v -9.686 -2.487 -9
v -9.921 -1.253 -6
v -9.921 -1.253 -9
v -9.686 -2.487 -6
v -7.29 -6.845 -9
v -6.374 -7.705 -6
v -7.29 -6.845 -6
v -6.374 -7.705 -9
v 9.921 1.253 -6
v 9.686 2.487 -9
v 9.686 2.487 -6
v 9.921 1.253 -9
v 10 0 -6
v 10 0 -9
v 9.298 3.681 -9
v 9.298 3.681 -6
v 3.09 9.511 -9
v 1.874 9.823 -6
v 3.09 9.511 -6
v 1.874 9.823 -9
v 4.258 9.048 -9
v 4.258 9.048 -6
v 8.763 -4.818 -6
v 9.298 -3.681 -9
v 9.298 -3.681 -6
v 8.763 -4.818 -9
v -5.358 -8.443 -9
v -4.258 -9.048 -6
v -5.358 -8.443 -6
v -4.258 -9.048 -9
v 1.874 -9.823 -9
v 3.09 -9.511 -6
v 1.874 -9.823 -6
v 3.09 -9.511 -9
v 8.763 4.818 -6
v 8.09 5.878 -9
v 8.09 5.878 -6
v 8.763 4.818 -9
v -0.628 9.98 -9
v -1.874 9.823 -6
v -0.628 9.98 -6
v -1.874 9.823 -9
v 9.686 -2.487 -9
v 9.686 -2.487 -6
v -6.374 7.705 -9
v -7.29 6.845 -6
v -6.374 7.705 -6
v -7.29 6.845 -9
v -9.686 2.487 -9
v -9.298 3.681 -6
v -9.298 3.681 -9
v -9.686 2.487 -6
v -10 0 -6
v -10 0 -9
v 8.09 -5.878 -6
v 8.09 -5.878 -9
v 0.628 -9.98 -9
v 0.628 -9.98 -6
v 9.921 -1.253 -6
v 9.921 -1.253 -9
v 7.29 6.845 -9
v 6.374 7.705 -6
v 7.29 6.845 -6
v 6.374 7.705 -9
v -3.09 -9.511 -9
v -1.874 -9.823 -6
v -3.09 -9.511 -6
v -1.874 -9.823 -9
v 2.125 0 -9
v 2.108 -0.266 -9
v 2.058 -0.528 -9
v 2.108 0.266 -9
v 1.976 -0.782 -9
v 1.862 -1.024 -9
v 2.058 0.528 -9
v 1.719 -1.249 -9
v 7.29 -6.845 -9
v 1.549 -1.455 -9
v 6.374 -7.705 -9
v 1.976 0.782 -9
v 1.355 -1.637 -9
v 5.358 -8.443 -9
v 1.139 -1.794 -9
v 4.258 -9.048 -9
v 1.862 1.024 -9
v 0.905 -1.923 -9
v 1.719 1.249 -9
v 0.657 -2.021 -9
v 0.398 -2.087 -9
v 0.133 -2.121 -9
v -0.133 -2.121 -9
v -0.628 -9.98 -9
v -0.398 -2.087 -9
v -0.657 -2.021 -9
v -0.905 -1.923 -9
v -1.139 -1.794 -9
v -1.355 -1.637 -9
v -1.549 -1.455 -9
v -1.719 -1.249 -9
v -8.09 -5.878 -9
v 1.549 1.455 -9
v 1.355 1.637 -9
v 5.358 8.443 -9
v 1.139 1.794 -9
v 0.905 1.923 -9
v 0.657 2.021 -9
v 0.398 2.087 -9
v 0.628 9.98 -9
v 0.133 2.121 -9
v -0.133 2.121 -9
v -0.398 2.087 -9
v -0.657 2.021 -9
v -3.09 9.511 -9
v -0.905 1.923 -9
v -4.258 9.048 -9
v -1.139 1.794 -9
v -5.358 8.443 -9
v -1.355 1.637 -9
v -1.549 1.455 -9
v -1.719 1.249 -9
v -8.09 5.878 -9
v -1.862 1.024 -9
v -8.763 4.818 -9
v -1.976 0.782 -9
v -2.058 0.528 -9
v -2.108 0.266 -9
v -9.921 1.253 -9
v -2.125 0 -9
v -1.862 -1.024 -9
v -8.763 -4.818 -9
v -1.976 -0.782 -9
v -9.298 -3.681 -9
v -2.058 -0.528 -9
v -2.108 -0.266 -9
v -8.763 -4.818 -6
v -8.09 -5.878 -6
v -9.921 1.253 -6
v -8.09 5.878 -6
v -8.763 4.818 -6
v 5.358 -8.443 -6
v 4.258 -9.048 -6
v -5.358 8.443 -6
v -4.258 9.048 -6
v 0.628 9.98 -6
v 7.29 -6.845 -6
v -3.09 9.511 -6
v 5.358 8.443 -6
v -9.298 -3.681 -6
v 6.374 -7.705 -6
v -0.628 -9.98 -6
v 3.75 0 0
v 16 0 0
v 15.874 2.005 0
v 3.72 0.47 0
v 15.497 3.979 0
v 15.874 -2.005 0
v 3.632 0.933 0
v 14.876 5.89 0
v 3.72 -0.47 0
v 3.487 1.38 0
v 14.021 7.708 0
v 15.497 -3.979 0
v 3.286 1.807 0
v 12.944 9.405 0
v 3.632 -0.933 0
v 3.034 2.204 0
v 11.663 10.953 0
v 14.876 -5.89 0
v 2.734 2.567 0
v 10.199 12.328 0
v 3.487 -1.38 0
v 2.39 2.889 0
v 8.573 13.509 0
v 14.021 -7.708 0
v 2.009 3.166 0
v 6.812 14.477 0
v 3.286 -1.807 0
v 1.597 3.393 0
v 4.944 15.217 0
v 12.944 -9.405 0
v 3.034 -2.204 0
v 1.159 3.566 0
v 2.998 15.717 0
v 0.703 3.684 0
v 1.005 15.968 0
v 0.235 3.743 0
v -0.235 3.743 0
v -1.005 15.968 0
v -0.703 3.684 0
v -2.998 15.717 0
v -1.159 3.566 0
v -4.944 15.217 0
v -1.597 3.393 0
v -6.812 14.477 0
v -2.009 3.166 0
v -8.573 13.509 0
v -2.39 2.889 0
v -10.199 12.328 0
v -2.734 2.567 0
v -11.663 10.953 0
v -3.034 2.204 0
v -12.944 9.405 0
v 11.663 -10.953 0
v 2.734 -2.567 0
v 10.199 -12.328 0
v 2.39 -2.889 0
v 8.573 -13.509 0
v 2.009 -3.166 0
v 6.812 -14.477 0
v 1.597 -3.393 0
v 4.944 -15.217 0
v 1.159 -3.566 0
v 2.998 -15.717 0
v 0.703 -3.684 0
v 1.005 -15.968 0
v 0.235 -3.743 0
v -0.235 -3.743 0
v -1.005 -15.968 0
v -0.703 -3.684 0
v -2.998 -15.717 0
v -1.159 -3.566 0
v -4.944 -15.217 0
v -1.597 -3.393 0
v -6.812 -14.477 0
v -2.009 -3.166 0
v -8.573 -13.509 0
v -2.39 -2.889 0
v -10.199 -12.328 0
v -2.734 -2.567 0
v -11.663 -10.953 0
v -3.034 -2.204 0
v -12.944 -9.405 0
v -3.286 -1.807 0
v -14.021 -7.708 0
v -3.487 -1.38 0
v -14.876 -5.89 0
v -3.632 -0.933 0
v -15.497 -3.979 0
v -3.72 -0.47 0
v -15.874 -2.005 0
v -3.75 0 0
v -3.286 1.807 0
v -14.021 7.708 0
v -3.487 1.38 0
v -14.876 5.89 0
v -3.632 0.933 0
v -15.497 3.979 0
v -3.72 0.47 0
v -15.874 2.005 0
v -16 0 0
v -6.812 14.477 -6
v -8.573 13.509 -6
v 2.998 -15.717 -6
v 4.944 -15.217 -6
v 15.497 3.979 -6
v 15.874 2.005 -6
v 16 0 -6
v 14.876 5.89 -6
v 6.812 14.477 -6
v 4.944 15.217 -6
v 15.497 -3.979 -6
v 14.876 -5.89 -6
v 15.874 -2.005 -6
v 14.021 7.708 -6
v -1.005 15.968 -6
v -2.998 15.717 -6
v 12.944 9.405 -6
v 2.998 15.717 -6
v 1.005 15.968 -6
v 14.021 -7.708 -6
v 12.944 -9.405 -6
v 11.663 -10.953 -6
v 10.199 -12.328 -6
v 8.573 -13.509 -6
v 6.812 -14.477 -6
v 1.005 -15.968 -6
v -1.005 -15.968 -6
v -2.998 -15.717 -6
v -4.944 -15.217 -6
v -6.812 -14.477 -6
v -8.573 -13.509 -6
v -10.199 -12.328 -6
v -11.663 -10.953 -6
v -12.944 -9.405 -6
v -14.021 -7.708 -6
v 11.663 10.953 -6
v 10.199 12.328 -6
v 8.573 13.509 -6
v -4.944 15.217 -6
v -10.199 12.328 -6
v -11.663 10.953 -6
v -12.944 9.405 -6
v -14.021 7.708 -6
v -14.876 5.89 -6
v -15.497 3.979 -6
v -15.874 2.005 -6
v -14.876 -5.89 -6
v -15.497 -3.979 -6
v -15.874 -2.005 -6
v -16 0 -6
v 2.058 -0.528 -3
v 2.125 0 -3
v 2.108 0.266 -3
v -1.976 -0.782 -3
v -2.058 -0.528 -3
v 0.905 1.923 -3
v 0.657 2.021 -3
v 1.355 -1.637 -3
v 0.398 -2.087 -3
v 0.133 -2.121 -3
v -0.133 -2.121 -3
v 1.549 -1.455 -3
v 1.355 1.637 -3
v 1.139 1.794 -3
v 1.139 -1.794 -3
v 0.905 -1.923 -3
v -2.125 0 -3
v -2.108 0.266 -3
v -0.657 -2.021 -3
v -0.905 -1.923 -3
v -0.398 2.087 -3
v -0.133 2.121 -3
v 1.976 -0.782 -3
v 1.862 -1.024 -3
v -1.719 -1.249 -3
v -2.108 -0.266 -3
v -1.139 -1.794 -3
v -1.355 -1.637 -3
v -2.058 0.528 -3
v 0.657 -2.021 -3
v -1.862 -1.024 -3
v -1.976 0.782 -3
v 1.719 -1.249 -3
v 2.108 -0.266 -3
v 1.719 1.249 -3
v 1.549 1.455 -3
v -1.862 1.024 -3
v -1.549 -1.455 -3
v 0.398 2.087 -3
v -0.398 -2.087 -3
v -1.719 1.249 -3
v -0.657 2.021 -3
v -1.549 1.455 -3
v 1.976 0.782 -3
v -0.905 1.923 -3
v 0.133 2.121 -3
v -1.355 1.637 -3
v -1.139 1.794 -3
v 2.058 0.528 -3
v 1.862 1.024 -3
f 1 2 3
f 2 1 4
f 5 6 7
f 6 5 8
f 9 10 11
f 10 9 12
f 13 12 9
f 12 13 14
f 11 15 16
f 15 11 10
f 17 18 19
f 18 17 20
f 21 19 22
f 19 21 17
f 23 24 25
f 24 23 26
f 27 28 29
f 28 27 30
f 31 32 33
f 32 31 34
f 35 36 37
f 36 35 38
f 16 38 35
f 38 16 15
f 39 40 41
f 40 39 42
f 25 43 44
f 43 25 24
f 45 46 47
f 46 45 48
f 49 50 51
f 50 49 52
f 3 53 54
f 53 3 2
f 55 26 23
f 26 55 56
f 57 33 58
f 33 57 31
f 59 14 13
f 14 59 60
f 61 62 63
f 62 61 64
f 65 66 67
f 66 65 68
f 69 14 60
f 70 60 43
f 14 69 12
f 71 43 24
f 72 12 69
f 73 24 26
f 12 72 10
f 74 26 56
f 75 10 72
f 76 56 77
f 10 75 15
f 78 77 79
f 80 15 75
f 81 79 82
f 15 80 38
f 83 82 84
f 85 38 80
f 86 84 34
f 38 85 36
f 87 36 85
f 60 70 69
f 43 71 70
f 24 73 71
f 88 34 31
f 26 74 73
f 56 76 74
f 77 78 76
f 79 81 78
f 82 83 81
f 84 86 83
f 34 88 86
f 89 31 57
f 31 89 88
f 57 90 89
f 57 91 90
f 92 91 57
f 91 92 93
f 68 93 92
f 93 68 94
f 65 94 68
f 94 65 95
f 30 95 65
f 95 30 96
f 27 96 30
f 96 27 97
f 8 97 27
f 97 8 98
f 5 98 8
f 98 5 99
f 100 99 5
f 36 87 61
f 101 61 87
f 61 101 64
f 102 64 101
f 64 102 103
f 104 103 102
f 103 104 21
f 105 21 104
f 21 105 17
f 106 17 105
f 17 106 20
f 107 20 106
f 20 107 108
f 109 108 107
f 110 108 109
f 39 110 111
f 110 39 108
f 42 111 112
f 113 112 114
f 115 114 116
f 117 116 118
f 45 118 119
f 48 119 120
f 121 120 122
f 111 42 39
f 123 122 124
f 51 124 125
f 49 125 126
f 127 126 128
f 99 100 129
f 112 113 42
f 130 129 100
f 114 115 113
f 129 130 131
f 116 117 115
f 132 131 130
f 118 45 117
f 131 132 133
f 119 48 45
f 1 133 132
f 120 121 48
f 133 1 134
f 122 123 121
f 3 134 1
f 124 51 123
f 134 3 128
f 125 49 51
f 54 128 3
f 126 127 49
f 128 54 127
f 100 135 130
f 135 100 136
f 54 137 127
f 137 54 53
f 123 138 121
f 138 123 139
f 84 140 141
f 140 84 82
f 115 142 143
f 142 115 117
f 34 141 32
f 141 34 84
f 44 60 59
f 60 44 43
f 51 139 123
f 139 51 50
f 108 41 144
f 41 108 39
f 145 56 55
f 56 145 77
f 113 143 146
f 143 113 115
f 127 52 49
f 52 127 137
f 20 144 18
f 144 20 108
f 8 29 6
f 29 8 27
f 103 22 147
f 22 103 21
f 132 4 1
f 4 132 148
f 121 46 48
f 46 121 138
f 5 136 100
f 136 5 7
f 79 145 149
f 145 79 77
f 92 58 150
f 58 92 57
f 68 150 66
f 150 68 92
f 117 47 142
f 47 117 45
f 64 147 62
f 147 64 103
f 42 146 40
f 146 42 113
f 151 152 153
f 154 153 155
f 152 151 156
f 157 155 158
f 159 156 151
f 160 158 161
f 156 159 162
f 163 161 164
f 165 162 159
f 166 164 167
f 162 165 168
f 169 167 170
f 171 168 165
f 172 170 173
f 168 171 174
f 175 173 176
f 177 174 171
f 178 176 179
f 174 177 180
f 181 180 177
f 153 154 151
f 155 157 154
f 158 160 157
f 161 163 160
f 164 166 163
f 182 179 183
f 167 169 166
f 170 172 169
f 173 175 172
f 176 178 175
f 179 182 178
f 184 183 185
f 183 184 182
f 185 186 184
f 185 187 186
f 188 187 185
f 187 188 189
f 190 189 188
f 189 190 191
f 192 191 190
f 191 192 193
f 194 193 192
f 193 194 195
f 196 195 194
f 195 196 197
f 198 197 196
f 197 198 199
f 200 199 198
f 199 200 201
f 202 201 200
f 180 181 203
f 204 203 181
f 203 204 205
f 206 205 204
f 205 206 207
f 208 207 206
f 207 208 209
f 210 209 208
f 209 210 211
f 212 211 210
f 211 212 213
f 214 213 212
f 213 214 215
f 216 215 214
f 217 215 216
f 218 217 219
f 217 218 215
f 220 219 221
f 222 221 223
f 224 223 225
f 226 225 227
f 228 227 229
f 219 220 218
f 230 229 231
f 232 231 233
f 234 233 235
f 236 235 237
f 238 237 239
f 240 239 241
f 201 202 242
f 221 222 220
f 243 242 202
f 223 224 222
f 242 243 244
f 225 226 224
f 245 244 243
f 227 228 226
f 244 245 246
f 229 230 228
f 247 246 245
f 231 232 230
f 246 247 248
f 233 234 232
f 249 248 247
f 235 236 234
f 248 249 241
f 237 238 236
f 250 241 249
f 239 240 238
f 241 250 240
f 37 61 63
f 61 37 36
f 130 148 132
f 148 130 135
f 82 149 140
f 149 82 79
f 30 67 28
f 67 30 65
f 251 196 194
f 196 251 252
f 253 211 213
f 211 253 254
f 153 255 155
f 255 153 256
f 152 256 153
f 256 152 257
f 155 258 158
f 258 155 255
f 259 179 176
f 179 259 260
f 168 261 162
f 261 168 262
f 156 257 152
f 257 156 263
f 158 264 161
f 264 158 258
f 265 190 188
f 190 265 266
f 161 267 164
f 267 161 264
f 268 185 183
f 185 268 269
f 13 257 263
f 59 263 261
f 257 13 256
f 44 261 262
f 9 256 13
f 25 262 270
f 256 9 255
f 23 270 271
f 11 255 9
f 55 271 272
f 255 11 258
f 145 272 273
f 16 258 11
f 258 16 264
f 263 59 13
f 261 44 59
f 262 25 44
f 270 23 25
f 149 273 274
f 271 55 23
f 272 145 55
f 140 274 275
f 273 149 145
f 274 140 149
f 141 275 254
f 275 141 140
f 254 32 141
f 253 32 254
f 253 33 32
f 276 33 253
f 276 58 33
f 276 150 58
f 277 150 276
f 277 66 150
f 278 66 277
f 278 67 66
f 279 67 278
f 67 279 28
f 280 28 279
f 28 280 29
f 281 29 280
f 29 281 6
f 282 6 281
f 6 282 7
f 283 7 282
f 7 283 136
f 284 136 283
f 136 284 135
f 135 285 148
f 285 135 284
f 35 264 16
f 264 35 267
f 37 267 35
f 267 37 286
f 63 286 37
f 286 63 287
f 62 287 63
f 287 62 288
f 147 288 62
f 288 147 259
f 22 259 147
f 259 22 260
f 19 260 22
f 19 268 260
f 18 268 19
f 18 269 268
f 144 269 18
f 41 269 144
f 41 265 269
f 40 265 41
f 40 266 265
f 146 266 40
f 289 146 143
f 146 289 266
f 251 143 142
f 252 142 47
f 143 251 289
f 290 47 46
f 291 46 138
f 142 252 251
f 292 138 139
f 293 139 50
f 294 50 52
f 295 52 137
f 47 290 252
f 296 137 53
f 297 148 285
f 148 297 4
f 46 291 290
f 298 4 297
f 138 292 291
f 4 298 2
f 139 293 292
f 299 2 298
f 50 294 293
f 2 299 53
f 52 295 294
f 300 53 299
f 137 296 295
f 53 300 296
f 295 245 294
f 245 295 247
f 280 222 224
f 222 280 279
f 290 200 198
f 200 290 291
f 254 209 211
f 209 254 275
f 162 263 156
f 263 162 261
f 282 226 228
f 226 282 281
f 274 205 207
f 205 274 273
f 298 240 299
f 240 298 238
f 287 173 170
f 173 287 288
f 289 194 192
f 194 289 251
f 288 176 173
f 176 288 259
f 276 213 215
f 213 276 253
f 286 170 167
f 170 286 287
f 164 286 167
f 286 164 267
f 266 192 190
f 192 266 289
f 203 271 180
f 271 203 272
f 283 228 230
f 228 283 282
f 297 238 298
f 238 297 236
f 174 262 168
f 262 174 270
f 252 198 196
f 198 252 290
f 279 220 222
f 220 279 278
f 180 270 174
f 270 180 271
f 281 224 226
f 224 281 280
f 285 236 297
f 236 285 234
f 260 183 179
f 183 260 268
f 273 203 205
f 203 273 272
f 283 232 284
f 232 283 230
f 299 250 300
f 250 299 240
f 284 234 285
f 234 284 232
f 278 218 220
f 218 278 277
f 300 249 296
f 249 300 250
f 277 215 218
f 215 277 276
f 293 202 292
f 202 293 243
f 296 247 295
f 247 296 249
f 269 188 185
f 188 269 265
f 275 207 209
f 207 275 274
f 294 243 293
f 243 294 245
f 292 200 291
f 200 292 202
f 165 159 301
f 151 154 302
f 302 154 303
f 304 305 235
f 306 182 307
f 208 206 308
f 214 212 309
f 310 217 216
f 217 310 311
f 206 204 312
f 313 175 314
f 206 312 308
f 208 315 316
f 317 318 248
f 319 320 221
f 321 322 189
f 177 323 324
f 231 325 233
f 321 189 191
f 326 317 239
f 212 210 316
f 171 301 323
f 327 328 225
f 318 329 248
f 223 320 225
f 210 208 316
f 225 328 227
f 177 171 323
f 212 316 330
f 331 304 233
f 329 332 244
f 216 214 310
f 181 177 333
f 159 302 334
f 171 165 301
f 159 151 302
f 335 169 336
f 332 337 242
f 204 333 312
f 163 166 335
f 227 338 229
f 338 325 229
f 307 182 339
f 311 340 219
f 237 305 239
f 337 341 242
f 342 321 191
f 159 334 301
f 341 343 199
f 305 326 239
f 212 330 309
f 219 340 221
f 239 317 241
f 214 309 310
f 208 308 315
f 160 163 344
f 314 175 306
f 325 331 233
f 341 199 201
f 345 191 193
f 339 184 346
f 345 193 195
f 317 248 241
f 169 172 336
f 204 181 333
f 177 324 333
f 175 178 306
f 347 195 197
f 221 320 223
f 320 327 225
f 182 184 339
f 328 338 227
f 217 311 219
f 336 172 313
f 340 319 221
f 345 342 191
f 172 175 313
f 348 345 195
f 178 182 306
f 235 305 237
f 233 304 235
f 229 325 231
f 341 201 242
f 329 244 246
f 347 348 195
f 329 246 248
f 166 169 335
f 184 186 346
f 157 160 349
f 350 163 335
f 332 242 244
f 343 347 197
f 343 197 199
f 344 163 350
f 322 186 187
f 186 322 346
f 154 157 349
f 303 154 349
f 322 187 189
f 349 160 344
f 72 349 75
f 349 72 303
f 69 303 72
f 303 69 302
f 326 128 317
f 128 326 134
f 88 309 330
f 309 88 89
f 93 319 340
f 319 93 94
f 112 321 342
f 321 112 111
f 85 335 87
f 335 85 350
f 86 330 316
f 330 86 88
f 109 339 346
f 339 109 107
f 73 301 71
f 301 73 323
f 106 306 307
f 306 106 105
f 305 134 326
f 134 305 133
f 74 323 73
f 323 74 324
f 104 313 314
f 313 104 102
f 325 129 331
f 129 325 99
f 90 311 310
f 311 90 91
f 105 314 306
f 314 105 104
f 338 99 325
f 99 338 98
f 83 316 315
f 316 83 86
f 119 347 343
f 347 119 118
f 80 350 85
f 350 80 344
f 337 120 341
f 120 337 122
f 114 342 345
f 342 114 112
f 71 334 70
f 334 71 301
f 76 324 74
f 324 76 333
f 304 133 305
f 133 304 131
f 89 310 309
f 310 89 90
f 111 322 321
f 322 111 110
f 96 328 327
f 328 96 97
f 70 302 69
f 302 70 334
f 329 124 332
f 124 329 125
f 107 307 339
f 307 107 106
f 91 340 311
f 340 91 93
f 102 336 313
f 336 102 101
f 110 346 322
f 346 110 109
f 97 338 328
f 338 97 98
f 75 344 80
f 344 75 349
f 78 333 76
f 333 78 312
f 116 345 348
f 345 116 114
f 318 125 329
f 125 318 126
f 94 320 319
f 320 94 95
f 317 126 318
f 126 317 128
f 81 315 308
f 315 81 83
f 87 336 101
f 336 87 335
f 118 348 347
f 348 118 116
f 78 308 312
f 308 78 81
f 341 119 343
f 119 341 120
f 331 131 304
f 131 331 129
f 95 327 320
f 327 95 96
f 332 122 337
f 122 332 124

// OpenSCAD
$fn = 50;


difference() {
	union() {
		translate(v = [0, 0, -9.0000000000]) {
			cylinder(h = 9, r = 10.0000000000);
		}
		translate(v = [0, 0, -6.0000000000]) {
			cylinder(h = 6, r = 16.0000000000);
		}
	}
	union() {
		translate(v = [0, 0, 0]) {
			rotate(a = [0, 0, 0]) {
				difference() {
					union() {
						#translate(v = [0, 0, -9.0000000000]) {
							cylinder(h = 9, r = 2.0000000000);
						}
						#translate(v = [0, 0, -3]) {
							cylinder(h = 3, r = 10.0000000000, r1 = 2.1250000000, r2 = 3.7500000000);
						}
						#translate(v = [0, 0, -9.0000000000]) {
							cylinder(h = 9, r = 2.1250000000);
						}
						#translate(v = [0, 0, -9.0000000000]) {
							cylinder(h = 9, r = 2.0000000000);
						}
					}
					union();
				}
			}
		}
	}
}
